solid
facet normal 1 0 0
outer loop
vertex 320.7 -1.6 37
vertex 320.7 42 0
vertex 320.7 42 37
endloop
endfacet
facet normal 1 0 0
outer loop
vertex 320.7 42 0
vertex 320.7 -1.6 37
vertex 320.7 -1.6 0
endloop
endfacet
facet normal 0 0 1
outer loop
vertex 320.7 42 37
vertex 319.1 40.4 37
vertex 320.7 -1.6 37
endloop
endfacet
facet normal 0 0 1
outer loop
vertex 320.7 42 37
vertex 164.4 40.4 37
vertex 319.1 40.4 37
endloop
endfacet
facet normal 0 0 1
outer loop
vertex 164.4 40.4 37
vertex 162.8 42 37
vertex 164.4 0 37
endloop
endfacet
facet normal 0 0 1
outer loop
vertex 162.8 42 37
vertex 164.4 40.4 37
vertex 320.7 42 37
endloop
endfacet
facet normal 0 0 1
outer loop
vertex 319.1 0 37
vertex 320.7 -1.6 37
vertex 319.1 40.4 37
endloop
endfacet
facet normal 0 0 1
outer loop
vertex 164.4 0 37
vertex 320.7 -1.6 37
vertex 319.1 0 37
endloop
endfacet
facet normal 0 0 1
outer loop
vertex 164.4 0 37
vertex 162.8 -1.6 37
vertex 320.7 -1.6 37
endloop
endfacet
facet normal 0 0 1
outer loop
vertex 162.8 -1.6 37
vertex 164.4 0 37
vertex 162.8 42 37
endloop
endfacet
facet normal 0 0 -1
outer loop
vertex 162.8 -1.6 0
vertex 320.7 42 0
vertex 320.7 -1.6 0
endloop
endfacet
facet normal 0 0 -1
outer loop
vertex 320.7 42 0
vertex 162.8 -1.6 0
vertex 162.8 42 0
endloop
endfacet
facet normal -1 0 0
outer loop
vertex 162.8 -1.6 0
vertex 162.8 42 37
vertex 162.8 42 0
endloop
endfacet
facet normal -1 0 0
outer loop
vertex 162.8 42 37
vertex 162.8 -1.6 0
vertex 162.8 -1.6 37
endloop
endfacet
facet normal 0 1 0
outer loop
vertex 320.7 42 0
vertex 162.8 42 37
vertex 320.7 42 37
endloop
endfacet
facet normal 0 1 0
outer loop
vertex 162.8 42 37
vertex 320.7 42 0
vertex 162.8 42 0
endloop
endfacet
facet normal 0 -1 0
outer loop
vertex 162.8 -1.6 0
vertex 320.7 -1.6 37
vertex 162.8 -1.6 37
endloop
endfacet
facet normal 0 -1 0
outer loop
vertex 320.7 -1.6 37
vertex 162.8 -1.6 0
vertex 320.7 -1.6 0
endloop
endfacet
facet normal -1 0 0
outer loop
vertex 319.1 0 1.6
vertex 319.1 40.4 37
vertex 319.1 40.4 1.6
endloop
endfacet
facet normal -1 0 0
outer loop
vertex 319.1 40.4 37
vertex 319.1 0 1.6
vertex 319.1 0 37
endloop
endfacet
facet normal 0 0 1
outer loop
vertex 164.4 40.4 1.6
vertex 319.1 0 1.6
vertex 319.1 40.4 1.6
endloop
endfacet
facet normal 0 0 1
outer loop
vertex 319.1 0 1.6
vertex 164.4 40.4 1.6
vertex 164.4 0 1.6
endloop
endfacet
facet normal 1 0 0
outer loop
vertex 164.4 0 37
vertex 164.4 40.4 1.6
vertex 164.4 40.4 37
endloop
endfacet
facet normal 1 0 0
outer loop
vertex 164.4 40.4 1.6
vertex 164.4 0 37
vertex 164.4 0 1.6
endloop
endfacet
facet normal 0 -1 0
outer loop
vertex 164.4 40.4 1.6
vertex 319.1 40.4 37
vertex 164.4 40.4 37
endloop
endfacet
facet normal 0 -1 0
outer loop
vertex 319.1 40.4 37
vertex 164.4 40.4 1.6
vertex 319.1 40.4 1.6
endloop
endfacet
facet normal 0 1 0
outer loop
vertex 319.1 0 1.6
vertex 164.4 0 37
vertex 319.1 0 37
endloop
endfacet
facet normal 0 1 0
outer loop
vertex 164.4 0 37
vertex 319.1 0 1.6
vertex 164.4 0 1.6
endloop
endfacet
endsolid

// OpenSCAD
/*
* Parametric Divider Box
*
*   Author: Bryan Smith - bryan.smith.dev@gmail.com
*   Created Date: 8/24/16
*   Updated Date: 9/10/16
*   Version: 1.3
*
*
*  Creative Commons Attribution-NonCommercial-ShareAlike 3.0 Unported License
*       (https://creativecommons.org/licenses/by-nc-sa/3.0/legalcode)
*/

///////////////////////////////////////////////////////////////////
//Customize the box. Sizes are in millimeters
///////////////////////////////////////////////////////////////////

//Do you want a lid to be generated?
generateLid=1; //[1:true,0:false]

//Do you want the box to be generated?
generateBox=0; //[1:true,0:false]

//What is the height of the item to be placed in the holes in mm?
itemHeight=68;

//What is the size of each hole in mm?
holeSize=10.0;

//Adds to the hole size so you can get items back out of the holes. Don't want it too tight. Can help account for shrinking too. I recomend around 0.7mm)
holeTolerence=0.7;

//Adds spacing to the width fit of the lid to help account for shrinking, printer accuracy, and different materials. (My printer FlashForge Creator Pro can use a tolerence of 0 for flexible material like TPU, but needs to add some space for rigid materials like ABS so that the lid will actually go down on the box.)
lidWidthTolerence=0.3;

//Adds spacing to the length fit of the lid to help account for shrinking, printer accuracy, and different materials. (My printer FlashForge Creator Pro can use a tolerence of 0 for flexible material like TPU, but needs to add some space for rigid materials like ABS so that the lid will actually go down on the box.)
lidLengthTolerence=0.3;

//How many rows of holes?
rows=3;

//How many columns of holes?
columns=12;

//The thickness of the outside lid walls.
lidWallWidth=1.6;

//The thickness of the outside box walls.
wallWidth=2;

//The thickness of the dividers.
dividerWidth=2;

//Box height as compared to item height. Allows the items to stick up higher than the box to help ease getting them out.
boxHeightPercentage=0.75; //[0.05:0.01:1.0]

//Divider height as compared to box height. This allows inset dividers to save material.
dividerHeightPercentage=0.75; //[0:0.01:1.0]

///////////////////////////////////////////////////////////////////
///////////////////////////////////////////////////////////////////

//Calculated Box Sizes. Do not change.
boxWidth=max(((dividerWidth*(columns-1))+(((holeSize+holeTolerence))*columns)+(wallWidth*2)),1);
boxLength=max(((dividerWidth*(rows-1))+(((holeSize+holeTolerence))*rows)+(wallWidth*2)),1);
boxFloorThickness=max(wallWidth,0.1);
boxHeight=max(itemHeight*boxHeightPercentage,1);
dividerHeight=min(boxHeight*dividerHeightPercentage,boxHeight);
lidHeight=(itemHeight-boxHeight)+20;
lidWidth=boxWidth+lidWidthTolerence+(lidWallWidth*2);
lidLength=boxLength+lidLengthTolerence+(lidWallWidth*2);

//Calculate the hole offsets
function holes(x) = ((holeSize+holeTolerence) * x)+(dividerWidth*x);

///////////////////////////////////////////////////////////////////
//Box
///////////////////////////////////////////////////////////////////
if (generateBox)
    difference(){
        difference(){
            cube([boxWidth,boxLength,boxHeight],false);
                for (r = [ 0 : 1 : rows-1 ])
                    for (c = [ 0 : 1 : columns-1 ])
                        translate([holes(c)+wallWidth, holes(r)+wallWidth, boxFloorThickness])
                        cube([(holeSize+holeTolerence),(holeSize+holeTolerence),itemHeight], center = false);
        }
        translate([wallWidth,wallWidth,min(dividerHeight,boxHeight+boxFloorThickness)])
        cube([boxWidth-(wallWidth*2),boxLength-(wallWidth*2),boxHeight*2],false);
    }

///////////////////////////////////////////////////////////////////
//Lid
///////////////////////////////////////////////////////////////////
if (generateLid)
    difference(){
        translate([-lidWallWidth+(boxWidth)+10,-lidWallWidth,0])
        cube([lidWidth,lidLength,lidHeight],false);

        translate([(boxWidth)+10,0,0])translate([0,0,lidWallWidth])
        cube([boxWidth+ lidLengthTolerence,boxLength+lidWidthTolerence,itemHeight*2],false);
    }
